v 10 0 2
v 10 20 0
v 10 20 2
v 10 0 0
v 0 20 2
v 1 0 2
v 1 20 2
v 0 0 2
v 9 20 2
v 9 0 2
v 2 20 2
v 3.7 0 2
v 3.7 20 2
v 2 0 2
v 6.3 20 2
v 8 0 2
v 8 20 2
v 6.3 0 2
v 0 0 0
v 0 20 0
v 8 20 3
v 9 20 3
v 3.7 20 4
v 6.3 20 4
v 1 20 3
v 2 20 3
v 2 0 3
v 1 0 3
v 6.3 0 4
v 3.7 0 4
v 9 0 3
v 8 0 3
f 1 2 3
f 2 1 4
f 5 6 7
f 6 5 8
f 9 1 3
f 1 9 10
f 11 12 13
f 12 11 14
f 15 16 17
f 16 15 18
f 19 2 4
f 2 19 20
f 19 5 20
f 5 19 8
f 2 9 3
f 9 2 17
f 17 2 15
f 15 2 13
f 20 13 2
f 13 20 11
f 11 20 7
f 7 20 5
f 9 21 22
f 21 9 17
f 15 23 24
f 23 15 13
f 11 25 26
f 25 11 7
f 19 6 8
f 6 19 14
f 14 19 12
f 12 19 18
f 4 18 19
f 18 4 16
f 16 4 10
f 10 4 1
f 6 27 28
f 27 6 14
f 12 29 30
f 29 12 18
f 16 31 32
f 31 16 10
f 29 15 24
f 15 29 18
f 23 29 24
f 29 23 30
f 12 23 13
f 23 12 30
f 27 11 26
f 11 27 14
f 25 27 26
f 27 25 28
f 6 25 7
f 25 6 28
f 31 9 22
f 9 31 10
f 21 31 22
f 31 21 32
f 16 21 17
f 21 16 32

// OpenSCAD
union() {
  cube([10,20,2]);
  translate([3.7,0,0]) { cube([2.6,20,4]); }
  translate([1,0,0]) { cube([1,20,3]); }
  translate([8,0,0]) { cube([1,20,3]); }
}
